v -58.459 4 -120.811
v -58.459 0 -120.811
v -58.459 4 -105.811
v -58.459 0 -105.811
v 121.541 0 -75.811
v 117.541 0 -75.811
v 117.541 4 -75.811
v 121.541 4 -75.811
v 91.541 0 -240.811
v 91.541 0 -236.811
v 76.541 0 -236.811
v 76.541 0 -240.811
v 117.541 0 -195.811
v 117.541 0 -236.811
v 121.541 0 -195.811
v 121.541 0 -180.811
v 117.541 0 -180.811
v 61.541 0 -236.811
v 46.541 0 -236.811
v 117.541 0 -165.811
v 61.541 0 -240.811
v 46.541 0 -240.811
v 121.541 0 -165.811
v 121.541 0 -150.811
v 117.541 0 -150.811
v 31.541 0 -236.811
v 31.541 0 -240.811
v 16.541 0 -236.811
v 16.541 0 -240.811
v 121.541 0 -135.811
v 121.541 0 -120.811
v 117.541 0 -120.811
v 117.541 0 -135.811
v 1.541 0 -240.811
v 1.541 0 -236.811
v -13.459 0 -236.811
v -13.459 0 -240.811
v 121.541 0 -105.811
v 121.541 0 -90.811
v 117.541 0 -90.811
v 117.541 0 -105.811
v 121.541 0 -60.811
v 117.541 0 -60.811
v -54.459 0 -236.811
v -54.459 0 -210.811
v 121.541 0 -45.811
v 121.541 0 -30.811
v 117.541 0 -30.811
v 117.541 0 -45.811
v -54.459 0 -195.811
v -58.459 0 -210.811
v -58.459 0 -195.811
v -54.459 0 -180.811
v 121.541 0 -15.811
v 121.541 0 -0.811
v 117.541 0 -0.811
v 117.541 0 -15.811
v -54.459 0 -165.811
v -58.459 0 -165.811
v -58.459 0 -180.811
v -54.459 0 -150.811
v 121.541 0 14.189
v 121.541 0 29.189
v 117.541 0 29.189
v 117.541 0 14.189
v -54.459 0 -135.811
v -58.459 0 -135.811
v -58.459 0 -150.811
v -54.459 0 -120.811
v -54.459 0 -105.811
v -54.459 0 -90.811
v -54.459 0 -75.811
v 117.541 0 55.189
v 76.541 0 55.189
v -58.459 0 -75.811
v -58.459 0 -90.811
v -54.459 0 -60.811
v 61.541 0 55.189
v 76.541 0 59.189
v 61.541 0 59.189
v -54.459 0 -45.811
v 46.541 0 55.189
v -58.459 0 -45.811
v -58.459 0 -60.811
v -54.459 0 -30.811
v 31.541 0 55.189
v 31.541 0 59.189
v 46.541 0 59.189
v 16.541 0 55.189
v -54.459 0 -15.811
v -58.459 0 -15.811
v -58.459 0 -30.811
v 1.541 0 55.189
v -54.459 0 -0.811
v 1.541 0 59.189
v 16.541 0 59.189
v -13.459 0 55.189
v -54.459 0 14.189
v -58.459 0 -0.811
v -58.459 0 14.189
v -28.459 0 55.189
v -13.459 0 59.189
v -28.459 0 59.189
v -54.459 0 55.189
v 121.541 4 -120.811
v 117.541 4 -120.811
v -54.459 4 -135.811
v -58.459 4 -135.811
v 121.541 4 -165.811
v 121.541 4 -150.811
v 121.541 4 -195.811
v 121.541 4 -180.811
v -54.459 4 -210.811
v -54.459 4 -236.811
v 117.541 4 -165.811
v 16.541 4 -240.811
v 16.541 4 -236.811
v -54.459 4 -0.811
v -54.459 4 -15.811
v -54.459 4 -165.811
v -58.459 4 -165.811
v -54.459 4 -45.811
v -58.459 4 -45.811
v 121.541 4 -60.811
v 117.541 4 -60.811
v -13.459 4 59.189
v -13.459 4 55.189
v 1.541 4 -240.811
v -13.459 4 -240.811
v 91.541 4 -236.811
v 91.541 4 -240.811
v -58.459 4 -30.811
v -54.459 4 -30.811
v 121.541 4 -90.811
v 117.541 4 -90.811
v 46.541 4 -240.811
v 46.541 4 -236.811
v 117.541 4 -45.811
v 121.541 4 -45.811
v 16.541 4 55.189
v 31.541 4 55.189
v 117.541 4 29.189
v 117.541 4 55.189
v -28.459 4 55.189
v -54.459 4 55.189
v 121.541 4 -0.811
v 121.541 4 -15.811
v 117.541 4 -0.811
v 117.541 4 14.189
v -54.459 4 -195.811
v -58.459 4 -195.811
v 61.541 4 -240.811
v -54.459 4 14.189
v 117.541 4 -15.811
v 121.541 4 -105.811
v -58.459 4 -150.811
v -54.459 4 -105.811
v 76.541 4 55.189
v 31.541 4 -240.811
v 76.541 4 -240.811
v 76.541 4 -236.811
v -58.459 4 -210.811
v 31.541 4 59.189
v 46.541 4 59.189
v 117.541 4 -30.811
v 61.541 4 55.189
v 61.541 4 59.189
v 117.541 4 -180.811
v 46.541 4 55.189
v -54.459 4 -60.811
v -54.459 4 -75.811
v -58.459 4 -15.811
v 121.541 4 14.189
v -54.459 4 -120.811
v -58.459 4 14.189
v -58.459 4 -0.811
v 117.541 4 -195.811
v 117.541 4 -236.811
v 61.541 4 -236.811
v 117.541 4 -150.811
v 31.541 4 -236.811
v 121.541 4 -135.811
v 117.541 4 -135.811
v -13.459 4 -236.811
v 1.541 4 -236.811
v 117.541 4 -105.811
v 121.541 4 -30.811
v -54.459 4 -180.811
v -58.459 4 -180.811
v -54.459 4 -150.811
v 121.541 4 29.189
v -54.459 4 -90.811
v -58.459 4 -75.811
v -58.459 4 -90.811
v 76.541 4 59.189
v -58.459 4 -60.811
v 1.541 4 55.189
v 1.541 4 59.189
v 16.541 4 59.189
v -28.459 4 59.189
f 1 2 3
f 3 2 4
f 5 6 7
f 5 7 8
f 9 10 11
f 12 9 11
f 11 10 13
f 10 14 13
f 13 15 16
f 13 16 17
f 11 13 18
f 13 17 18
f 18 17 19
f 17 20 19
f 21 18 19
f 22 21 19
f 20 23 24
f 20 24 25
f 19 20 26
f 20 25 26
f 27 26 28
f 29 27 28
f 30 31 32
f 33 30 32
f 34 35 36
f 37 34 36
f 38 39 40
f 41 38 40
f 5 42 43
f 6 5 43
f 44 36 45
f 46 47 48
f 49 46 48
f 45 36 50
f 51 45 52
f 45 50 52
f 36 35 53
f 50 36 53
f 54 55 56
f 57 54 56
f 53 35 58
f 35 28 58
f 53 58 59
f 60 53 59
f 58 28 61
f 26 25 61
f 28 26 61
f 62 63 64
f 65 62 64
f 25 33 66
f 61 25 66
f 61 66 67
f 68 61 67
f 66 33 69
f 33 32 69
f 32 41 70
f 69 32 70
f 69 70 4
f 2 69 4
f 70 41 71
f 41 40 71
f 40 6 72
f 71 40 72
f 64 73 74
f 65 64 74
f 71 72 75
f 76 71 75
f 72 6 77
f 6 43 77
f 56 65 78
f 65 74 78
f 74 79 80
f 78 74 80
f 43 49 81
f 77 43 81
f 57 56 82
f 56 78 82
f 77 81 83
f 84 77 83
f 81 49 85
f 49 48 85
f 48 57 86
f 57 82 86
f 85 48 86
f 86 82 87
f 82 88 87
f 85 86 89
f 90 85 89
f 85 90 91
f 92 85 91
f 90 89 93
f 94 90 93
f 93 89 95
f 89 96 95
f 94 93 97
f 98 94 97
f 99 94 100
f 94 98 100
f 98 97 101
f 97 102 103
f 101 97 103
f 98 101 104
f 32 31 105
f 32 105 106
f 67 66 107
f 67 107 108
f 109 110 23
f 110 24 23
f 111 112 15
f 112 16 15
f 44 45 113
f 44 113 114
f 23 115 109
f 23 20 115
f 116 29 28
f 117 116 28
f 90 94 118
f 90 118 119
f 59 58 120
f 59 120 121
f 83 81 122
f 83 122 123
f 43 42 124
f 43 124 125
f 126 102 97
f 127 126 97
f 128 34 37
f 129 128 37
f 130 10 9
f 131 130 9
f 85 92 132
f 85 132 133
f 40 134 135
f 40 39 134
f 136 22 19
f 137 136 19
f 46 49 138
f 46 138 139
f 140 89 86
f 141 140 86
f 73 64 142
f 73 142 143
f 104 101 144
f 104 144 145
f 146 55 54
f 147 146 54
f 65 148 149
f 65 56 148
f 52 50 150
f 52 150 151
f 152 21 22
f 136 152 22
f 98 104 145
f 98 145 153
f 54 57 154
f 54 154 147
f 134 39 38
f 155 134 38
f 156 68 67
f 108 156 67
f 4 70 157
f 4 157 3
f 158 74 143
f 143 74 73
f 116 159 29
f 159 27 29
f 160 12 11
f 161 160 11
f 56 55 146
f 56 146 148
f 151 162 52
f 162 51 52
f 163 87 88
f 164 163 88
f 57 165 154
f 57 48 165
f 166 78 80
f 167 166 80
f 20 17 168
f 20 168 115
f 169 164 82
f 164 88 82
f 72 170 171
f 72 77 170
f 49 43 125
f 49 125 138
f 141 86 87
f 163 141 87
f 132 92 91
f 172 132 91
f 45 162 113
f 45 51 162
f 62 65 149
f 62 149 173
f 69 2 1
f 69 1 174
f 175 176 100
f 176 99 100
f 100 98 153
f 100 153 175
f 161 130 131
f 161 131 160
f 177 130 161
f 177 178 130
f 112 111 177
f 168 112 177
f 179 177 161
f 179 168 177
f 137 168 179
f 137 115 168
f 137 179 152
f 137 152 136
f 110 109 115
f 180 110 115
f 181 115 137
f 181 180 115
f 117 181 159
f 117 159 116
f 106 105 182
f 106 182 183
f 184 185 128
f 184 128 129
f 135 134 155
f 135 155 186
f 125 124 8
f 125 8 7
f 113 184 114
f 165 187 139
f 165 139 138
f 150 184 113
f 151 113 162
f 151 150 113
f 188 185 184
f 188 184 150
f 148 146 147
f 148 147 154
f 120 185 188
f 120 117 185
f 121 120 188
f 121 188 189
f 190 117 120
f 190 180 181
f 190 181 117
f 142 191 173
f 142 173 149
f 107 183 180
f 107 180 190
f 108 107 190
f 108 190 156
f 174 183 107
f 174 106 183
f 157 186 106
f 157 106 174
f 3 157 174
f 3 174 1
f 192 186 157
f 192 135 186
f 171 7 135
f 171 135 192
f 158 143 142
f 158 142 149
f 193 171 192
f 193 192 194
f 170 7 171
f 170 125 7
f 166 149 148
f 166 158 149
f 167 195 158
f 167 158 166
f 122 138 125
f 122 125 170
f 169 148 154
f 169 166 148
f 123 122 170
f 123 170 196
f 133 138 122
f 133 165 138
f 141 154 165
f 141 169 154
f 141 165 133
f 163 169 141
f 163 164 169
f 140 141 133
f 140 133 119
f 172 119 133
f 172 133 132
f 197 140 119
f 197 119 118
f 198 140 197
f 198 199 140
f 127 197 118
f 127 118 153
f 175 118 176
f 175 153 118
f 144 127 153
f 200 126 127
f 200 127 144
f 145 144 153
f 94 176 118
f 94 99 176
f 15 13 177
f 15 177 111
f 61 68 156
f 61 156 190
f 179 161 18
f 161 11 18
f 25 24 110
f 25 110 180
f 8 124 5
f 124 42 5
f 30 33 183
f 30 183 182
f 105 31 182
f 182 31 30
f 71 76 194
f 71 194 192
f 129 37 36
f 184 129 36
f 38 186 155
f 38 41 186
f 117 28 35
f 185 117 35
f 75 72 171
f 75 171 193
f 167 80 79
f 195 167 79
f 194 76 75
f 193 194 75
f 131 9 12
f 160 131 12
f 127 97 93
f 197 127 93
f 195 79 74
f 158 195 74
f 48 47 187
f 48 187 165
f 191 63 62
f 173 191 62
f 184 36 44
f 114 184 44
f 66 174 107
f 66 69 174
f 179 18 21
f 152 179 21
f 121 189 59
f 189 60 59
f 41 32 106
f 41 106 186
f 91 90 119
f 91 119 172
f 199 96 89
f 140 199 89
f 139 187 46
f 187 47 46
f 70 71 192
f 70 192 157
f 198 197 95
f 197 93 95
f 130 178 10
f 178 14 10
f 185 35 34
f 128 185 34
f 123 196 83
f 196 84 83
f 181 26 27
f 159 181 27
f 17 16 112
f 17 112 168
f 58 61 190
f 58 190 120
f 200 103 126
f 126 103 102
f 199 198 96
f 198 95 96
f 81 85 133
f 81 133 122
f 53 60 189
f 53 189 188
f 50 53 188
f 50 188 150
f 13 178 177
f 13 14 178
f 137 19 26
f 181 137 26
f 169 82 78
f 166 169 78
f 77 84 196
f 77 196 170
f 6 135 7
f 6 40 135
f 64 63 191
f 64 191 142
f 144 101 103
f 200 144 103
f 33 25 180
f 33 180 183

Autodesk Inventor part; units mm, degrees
ref_plane "YZ Plane" through (0, 0, 0) normal (1, 0, 0) x (0, 1, 0)
ref_plane "XZ Plane" through (0, 0, 0) normal (0, 1, 0) x (-1, 0, 0)
ref_plane "XY Plane" through (0, 0, 0) normal (0, 0, 1) x (1, 0, 0)
sketch "Sketch1" plane through (0, 0, 0) normal (0, 1, 0) x (-1, 0, 0)
  line L0 (58.4588, 59.1887) -> (-121.5412, 59.1887)
  line L1 (-121.5412, -240.8113) -> (58.4588, -240.8113)
  line L2 (58.4588, -240.8113) -> (58.4588, 59.1887)
  line L3 (-121.5412, 59.1887) -> (-121.5412, -240.8113)
  line L4 (58.4588, 59.1887) -> (54.4588, 59.1887)
  line L5 (54.4588, 59.1887) -> (54.4588, 44.1887)
  line L6 (54.4588, 44.1887) -> (58.4588, 44.1887)
  line L7 (58.4588, 44.1887) -> (58.4588, 59.1887)
  line L8 (54.4588, 29.1887) -> (54.4588, 14.1887)
  line L9 (54.4588, 14.1887) -> (58.4588, 14.1887)
  line L10 (58.4588, 29.1887) -> (54.4588, 29.1887)
  line L11 (54.4588, -0.8113) -> (54.4588, -15.8113)
  line L12 (54.4588, -15.8113) -> (58.4588, -15.8113)
  line L13 (58.4588, -0.8113) -> (54.4588, -0.8113)
  line L14 (54.4588, -30.8113) -> (54.4588, -45.8113)
  line L15 (54.4588, -45.8113) -> (58.4588, -45.8113)
  line L16 (58.4588, -30.8113) -> (54.4588, -30.8113)
  line L17 (54.4588, -60.8113) -> (54.4588, -75.8113)
  line L18 (54.4588, -75.8113) -> (58.4588, -75.8113)
  line L19 (58.4588, -60.8113) -> (54.4588, -60.8113)
  line L20 (54.4588, -90.8113) -> (54.4588, -105.8113)
  line L21 (54.4588, -105.8113) -> (58.4588, -105.8113)
  line L22 (58.4588, -90.8113) -> (54.4588, -90.8113)
  line L23 (54.4588, -120.8113) -> (54.4588, -135.8113)
  line L24 (54.4588, -135.8113) -> (58.4588, -135.8113)
  line L25 (58.4588, -120.8113) -> (54.4588, -120.8113)
  line L26 (54.4588, -150.8113) -> (54.4588, -165.8113)
  line L27 (54.4588, -165.8113) -> (58.4588, -165.8113)
  line L28 (58.4588, -150.8113) -> (54.4588, -150.8113)
  line L29 (54.4588, -180.8113) -> (54.4588, -195.8113)
  line L30 (54.4588, -195.8113) -> (58.4588, -195.8113)
  line L31 (58.4588, -180.8113) -> (54.4588, -180.8113)
  line L32 (54.4588, -210.8113) -> (54.4588, -225.8113)
  line L33 (54.4588, -225.8113) -> (58.4588, -225.8113)
  line L34 (58.4588, -210.8113) -> (54.4588, -210.8113)
  line L35 (-121.5412, -240.8113) -> (-117.5412, -240.8113)
  line L36 (-117.5412, -240.8113) -> (-117.5412, -225.8113)
  line L37 (-117.5412, -225.8113) -> (-121.5412, -225.8113)
  line L38 (-121.5412, -225.8113) -> (-121.5412, -240.8113)
  line L39 (-117.5412, -210.8113) -> (-117.5412, -195.8113)
  line L40 (-117.5412, -195.8113) -> (-121.5412, -195.8113)
  line L41 (-121.5412, -210.8113) -> (-117.5412, -210.8113)
  line L42 (-117.5412, -180.8113) -> (-117.5412, -165.8113)
  line L43 (-117.5412, -165.8113) -> (-121.5412, -165.8113)
  line L44 (-121.5412, -180.8113) -> (-117.5412, -180.8113)
  line L45 (-117.5412, -150.8113) -> (-117.5412, -135.8113)
  line L46 (-117.5412, -135.8113) -> (-121.5412, -135.8113)
  line L47 (-121.5412, -150.8113) -> (-117.5412, -150.8113)
  line L48 (-117.5412, -120.8113) -> (-117.5412, -105.8113)
  line L49 (-117.5412, -105.8113) -> (-121.5412, -105.8113)
  line L50 (-121.5412, -120.8113) -> (-117.5412, -120.8113)
  line L51 (-117.5412, -90.8113) -> (-117.5412, -75.8113)
  line L52 (-117.5412, -75.8113) -> (-121.5412, -75.8113)
  line L53 (-121.5412, -90.8113) -> (-117.5412, -90.8113)
  line L54 (-117.5412, -60.8113) -> (-117.5412, -45.8113)
  line L55 (-117.5412, -45.8113) -> (-121.5412, -45.8113)
  line L56 (-121.5412, -60.8113) -> (-117.5412, -60.8113)
  line L57 (-117.5412, -30.8113) -> (-117.5412, -15.8113)
  line L58 (-117.5412, -15.8113) -> (-121.5412, -15.8113)
  line L59 (-121.5412, -30.8113) -> (-117.5412, -30.8113)
  line L60 (-117.5412, -0.8113) -> (-117.5412, 14.1887)
  line L61 (-117.5412, 14.1887) -> (-121.5412, 14.1887)
  line L62 (-121.5412, -0.8113) -> (-117.5412, -0.8113)
  line L63 (-117.5412, 29.1887) -> (-117.5412, 44.1887)
  line L64 (-117.5412, 44.1887) -> (-121.5412, 44.1887)
  line L65 (-121.5412, 29.1887) -> (-117.5412, 29.1887)
  line L66 (58.4588, -240.8113) -> (43.4588, -240.8113)
  line L67 (43.4588, -240.8113) -> (43.4588, -236.8113)
  line L68 (43.4588, -236.8113) -> (58.4588, -236.8113)
  line L69 (58.4588, -236.8113) -> (58.4588, -240.8113)
  line L70 (13.4588, -236.8113) -> (28.4588, -236.8113)
  line L71 (13.4588, -240.8113) -> (13.4588, -236.8113)
  line L72 (28.4588, -236.8113) -> (28.4588, -240.8113)
  line L73 (-16.5412, -236.8113) -> (-1.5412, -236.8113)
  line L74 (-16.5412, -240.8113) -> (-16.5412, -236.8113)
  line L75 (-1.5412, -236.8113) -> (-1.5412, -240.8113)
  line L76 (-46.5412, -236.8113) -> (-31.5412, -236.8113)
  line L77 (-46.5412, -240.8113) -> (-46.5412, -236.8113)
  line L78 (-31.5412, -236.8113) -> (-31.5412, -240.8113)
  line L79 (-76.5412, -236.8113) -> (-61.5412, -236.8113)
  line L80 (-76.5412, -240.8113) -> (-76.5412, -236.8113)
  line L81 (-61.5412, -236.8113) -> (-61.5412, -240.8113)
  line L82 (-106.5412, -236.8113) -> (-91.5412, -236.8113)
  line L83 (-106.5412, -240.8113) -> (-106.5412, -236.8113)
  line L84 (-91.5412, -236.8113) -> (-91.5412, -240.8113)
  line L85 (-121.5412, 59.1887) -> (-106.5412, 59.1887)
  line L86 (-106.5412, 59.1887) -> (-106.5412, 55.1887)
  line L87 (-106.5412, 55.1887) -> (-121.5412, 55.1887)
  line L88 (-121.5412, 55.1887) -> (-121.5412, 59.1887)
  line L89 (-76.5412, 59.1887) -> (-76.5412, 55.1887)
  line L90 (-76.5412, 55.1887) -> (-91.5412, 55.1887)
  line L91 (-91.5412, 55.1887) -> (-91.5412, 59.1887)
  line L92 (-46.5412, 59.1887) -> (-46.5412, 55.1887)
  line L93 (-46.5412, 55.1887) -> (-61.5412, 55.1887)
  line L94 (-61.5412, 55.1887) -> (-61.5412, 59.1887)
  line L95 (-16.5412, 59.1887) -> (-16.5412, 55.1887)
  line L96 (-16.5412, 55.1887) -> (-31.5412, 55.1887)
  line L97 (-31.5412, 55.1887) -> (-31.5412, 59.1887)
  line L98 (13.4588, 59.1887) -> (13.4588, 55.1887)
  line L99 (13.4588, 55.1887) -> (-1.5412, 55.1887)
  line L100 (-1.5412, 55.1887) -> (-1.5412, 59.1887)
  line L101 (43.4588, 59.1887) -> (43.4588, 55.1887)
  line L102 (43.4588, 55.1887) -> (28.4588, 55.1887)
  line L103 (28.4588, 55.1887) -> (28.4588, 59.1887)
  dimension "d22" = 4
  dimension "d23" = 15
  dimension "d26" = 30
  dimension "d31" = 4
  dimension "d32" = 15
  dimension "d35" = 30
  dimension "d40" = 15
  dimension "d41" = 4
  dimension "d44" = 30
  dimension "d49" = 15
  dimension "d50" = 4
  dimension "d53" = 30
extrude "Extrusion1" add sketch "Sketch1" along normal blind 4 contours L5 L6 L2 L10 L8 L9 L13 L11 L12 L16 L14 L15 L19 L17 L18 L22 L20 L21 L25 L23 L24 L28 L26 L27 L31 L29 L30 L34 L32 L33 L68 L67 L1 L72 L70 L71 L75 L73 L74 L78 L76 L77 L81 L79 L80 L84 L82 L83 L36 L37 L3 L41 L39 L40 L44 L42 L43 L47 L45 L46 L50 L48 L49 L53 L51 L52 L56 L54 L55 L59 L57 L58 L62 L60 L61 L65 L63 L64 L87 L86 L0 L91 L90 L89 L94 L93 L92 L97 L96 L95 L100 L99 L98 L103 L102 L101
sketch "Sketch2" plane through (0, 0, 0) normal (0, -1, 0) x (1, 0, 0)
  line L0 (-54.4588, 29.1887) -> (-58.4588, 29.1887) projected
  line L1 (-58.4588, 29.1887) -> (-58.4588, 44.1887) projected
  line L2 (-54.4588, 29.1887) -> (-58.4588, 29.1887)
  line L3 (-58.4588, 29.1887) -> (-58.4588, 44.1887)
  line L4 (-58.4588, 44.1887) -> (-54.4588, 44.1887)
  line L5 (-54.4588, 44.1887) -> (-54.4588, 29.1887)
  line L6 (91.5412, 59.1887) -> (106.5412, 59.1887) projected
  line L7 (91.5412, 59.1887) -> (106.5412, 59.1887)
  line L8 (106.5412, 59.1887) -> (106.5412, 55.1887)
  line L9 (106.5412, 55.1887) -> (91.5412, 55.1887)
  line L10 (91.5412, 55.1887) -> (91.5412, 59.1887)
  line L11 (117.5412, -225.8113) -> (117.5412, -240.8113) projected
  line L12 (106.5412, -236.8113) -> (91.5412, -236.8113) projected
  line L13 (117.5412, -240.8113) -> (106.5412, -240.8113)
  line L14 (106.5412, -240.8113) -> (106.5412, -236.8113)
  line L15 (106.5412, -236.8113) -> (117.5412, -236.8113)
  line L16 (117.5412, -236.8113) -> (117.5412, -240.8113)
  line L17 (121.5412, -225.8113) -> (117.5412, -225.8113) projected
  line L18 (121.5412, -210.8113) -> (121.5412, -225.8113) projected
  line L19 (117.5412, -225.8113) -> (121.5412, -225.8113)
  line L20 (121.5412, -225.8113) -> (121.5412, -210.8113)
  line L21 (121.5412, -210.8113) -> (117.5412, -210.8113)
  line L22 (117.5412, -210.8113) -> (117.5412, -225.8113)
  line L23 (-54.4588, -225.8113) -> (-54.4588, -210.8113) projected
  line L24 (-54.4588, -225.8113) -> (-58.4588, -225.8113)
  line L25 (-58.4588, -225.8113) -> (-58.4588, -236.8113)
  line L26 (-58.4588, -236.8113) -> (-54.4588, -236.8113)
  line L27 (-54.4588, -236.8113) -> (-54.4588, -225.8113)
  line L28 (-28.4588, -240.8113) -> (-43.4588, -240.8113) projected
  line L29 (-43.4588, -240.8113) -> (-43.4588, -236.8113) projected
  line L30 (-28.4588, -240.8113) -> (-43.4588, -240.8113)
  line L31 (-43.4588, -240.8113) -> (-43.4588, -236.8113)
  line L32 (-43.4588, -236.8113) -> (-28.4588, -236.8113)
  line L33 (-28.4588, -236.8113) -> (-28.4588, -240.8113)
  line L34 (121.5412, 55.1887) -> (121.5412, 44.1887) projected
  line L35 (121.5412, 44.1887) -> (117.5412, 44.1887) projected
  line L36 (121.5412, 55.1887) -> (117.5412, 55.1887)
  line L37 (117.5412, 55.1887) -> (117.5412, 44.1887)
  line L38 (117.5412, 44.1887) -> (121.5412, 44.1887)
  line L39 (121.5412, 44.1887) -> (121.5412, 55.1887)
  line L40 (-54.4588, 59.1887) -> (-43.4588, 59.1887) projected
  line L41 (-43.4588, 55.1887) -> (-28.4588, 55.1887) projected
  line L42 (-54.4588, 59.1887) -> (-43.4588, 59.1887)
  line L43 (-43.4588, 59.1887) -> (-43.4588, 55.1887)
  line L44 (-43.4588, 55.1887) -> (-54.4588, 55.1887)
  line L45 (-54.4588, 55.1887) -> (-54.4588, 59.1887)
  point P0 (0, 0)
extrude "Extrusion2" cut sketch "Sketch2" against normal through all
equation "\"d22\" = WoodThickness"
equation "\"d26\" = 2 * d23"
equation "\"d31\" = WoodThickness"
equation "\"d35\" = 2 * d32"
equation "\"d41\" = WoodThickness"
equation "\"d44\" = 2 * d40"
equation "\"d50\" = WoodThickness"
equation "\"d53\" = 2 * d49"
equation "\"d2\" = WoodThickness"
equation "\"WoodThickness\" = 4"
properties part number "ground"
